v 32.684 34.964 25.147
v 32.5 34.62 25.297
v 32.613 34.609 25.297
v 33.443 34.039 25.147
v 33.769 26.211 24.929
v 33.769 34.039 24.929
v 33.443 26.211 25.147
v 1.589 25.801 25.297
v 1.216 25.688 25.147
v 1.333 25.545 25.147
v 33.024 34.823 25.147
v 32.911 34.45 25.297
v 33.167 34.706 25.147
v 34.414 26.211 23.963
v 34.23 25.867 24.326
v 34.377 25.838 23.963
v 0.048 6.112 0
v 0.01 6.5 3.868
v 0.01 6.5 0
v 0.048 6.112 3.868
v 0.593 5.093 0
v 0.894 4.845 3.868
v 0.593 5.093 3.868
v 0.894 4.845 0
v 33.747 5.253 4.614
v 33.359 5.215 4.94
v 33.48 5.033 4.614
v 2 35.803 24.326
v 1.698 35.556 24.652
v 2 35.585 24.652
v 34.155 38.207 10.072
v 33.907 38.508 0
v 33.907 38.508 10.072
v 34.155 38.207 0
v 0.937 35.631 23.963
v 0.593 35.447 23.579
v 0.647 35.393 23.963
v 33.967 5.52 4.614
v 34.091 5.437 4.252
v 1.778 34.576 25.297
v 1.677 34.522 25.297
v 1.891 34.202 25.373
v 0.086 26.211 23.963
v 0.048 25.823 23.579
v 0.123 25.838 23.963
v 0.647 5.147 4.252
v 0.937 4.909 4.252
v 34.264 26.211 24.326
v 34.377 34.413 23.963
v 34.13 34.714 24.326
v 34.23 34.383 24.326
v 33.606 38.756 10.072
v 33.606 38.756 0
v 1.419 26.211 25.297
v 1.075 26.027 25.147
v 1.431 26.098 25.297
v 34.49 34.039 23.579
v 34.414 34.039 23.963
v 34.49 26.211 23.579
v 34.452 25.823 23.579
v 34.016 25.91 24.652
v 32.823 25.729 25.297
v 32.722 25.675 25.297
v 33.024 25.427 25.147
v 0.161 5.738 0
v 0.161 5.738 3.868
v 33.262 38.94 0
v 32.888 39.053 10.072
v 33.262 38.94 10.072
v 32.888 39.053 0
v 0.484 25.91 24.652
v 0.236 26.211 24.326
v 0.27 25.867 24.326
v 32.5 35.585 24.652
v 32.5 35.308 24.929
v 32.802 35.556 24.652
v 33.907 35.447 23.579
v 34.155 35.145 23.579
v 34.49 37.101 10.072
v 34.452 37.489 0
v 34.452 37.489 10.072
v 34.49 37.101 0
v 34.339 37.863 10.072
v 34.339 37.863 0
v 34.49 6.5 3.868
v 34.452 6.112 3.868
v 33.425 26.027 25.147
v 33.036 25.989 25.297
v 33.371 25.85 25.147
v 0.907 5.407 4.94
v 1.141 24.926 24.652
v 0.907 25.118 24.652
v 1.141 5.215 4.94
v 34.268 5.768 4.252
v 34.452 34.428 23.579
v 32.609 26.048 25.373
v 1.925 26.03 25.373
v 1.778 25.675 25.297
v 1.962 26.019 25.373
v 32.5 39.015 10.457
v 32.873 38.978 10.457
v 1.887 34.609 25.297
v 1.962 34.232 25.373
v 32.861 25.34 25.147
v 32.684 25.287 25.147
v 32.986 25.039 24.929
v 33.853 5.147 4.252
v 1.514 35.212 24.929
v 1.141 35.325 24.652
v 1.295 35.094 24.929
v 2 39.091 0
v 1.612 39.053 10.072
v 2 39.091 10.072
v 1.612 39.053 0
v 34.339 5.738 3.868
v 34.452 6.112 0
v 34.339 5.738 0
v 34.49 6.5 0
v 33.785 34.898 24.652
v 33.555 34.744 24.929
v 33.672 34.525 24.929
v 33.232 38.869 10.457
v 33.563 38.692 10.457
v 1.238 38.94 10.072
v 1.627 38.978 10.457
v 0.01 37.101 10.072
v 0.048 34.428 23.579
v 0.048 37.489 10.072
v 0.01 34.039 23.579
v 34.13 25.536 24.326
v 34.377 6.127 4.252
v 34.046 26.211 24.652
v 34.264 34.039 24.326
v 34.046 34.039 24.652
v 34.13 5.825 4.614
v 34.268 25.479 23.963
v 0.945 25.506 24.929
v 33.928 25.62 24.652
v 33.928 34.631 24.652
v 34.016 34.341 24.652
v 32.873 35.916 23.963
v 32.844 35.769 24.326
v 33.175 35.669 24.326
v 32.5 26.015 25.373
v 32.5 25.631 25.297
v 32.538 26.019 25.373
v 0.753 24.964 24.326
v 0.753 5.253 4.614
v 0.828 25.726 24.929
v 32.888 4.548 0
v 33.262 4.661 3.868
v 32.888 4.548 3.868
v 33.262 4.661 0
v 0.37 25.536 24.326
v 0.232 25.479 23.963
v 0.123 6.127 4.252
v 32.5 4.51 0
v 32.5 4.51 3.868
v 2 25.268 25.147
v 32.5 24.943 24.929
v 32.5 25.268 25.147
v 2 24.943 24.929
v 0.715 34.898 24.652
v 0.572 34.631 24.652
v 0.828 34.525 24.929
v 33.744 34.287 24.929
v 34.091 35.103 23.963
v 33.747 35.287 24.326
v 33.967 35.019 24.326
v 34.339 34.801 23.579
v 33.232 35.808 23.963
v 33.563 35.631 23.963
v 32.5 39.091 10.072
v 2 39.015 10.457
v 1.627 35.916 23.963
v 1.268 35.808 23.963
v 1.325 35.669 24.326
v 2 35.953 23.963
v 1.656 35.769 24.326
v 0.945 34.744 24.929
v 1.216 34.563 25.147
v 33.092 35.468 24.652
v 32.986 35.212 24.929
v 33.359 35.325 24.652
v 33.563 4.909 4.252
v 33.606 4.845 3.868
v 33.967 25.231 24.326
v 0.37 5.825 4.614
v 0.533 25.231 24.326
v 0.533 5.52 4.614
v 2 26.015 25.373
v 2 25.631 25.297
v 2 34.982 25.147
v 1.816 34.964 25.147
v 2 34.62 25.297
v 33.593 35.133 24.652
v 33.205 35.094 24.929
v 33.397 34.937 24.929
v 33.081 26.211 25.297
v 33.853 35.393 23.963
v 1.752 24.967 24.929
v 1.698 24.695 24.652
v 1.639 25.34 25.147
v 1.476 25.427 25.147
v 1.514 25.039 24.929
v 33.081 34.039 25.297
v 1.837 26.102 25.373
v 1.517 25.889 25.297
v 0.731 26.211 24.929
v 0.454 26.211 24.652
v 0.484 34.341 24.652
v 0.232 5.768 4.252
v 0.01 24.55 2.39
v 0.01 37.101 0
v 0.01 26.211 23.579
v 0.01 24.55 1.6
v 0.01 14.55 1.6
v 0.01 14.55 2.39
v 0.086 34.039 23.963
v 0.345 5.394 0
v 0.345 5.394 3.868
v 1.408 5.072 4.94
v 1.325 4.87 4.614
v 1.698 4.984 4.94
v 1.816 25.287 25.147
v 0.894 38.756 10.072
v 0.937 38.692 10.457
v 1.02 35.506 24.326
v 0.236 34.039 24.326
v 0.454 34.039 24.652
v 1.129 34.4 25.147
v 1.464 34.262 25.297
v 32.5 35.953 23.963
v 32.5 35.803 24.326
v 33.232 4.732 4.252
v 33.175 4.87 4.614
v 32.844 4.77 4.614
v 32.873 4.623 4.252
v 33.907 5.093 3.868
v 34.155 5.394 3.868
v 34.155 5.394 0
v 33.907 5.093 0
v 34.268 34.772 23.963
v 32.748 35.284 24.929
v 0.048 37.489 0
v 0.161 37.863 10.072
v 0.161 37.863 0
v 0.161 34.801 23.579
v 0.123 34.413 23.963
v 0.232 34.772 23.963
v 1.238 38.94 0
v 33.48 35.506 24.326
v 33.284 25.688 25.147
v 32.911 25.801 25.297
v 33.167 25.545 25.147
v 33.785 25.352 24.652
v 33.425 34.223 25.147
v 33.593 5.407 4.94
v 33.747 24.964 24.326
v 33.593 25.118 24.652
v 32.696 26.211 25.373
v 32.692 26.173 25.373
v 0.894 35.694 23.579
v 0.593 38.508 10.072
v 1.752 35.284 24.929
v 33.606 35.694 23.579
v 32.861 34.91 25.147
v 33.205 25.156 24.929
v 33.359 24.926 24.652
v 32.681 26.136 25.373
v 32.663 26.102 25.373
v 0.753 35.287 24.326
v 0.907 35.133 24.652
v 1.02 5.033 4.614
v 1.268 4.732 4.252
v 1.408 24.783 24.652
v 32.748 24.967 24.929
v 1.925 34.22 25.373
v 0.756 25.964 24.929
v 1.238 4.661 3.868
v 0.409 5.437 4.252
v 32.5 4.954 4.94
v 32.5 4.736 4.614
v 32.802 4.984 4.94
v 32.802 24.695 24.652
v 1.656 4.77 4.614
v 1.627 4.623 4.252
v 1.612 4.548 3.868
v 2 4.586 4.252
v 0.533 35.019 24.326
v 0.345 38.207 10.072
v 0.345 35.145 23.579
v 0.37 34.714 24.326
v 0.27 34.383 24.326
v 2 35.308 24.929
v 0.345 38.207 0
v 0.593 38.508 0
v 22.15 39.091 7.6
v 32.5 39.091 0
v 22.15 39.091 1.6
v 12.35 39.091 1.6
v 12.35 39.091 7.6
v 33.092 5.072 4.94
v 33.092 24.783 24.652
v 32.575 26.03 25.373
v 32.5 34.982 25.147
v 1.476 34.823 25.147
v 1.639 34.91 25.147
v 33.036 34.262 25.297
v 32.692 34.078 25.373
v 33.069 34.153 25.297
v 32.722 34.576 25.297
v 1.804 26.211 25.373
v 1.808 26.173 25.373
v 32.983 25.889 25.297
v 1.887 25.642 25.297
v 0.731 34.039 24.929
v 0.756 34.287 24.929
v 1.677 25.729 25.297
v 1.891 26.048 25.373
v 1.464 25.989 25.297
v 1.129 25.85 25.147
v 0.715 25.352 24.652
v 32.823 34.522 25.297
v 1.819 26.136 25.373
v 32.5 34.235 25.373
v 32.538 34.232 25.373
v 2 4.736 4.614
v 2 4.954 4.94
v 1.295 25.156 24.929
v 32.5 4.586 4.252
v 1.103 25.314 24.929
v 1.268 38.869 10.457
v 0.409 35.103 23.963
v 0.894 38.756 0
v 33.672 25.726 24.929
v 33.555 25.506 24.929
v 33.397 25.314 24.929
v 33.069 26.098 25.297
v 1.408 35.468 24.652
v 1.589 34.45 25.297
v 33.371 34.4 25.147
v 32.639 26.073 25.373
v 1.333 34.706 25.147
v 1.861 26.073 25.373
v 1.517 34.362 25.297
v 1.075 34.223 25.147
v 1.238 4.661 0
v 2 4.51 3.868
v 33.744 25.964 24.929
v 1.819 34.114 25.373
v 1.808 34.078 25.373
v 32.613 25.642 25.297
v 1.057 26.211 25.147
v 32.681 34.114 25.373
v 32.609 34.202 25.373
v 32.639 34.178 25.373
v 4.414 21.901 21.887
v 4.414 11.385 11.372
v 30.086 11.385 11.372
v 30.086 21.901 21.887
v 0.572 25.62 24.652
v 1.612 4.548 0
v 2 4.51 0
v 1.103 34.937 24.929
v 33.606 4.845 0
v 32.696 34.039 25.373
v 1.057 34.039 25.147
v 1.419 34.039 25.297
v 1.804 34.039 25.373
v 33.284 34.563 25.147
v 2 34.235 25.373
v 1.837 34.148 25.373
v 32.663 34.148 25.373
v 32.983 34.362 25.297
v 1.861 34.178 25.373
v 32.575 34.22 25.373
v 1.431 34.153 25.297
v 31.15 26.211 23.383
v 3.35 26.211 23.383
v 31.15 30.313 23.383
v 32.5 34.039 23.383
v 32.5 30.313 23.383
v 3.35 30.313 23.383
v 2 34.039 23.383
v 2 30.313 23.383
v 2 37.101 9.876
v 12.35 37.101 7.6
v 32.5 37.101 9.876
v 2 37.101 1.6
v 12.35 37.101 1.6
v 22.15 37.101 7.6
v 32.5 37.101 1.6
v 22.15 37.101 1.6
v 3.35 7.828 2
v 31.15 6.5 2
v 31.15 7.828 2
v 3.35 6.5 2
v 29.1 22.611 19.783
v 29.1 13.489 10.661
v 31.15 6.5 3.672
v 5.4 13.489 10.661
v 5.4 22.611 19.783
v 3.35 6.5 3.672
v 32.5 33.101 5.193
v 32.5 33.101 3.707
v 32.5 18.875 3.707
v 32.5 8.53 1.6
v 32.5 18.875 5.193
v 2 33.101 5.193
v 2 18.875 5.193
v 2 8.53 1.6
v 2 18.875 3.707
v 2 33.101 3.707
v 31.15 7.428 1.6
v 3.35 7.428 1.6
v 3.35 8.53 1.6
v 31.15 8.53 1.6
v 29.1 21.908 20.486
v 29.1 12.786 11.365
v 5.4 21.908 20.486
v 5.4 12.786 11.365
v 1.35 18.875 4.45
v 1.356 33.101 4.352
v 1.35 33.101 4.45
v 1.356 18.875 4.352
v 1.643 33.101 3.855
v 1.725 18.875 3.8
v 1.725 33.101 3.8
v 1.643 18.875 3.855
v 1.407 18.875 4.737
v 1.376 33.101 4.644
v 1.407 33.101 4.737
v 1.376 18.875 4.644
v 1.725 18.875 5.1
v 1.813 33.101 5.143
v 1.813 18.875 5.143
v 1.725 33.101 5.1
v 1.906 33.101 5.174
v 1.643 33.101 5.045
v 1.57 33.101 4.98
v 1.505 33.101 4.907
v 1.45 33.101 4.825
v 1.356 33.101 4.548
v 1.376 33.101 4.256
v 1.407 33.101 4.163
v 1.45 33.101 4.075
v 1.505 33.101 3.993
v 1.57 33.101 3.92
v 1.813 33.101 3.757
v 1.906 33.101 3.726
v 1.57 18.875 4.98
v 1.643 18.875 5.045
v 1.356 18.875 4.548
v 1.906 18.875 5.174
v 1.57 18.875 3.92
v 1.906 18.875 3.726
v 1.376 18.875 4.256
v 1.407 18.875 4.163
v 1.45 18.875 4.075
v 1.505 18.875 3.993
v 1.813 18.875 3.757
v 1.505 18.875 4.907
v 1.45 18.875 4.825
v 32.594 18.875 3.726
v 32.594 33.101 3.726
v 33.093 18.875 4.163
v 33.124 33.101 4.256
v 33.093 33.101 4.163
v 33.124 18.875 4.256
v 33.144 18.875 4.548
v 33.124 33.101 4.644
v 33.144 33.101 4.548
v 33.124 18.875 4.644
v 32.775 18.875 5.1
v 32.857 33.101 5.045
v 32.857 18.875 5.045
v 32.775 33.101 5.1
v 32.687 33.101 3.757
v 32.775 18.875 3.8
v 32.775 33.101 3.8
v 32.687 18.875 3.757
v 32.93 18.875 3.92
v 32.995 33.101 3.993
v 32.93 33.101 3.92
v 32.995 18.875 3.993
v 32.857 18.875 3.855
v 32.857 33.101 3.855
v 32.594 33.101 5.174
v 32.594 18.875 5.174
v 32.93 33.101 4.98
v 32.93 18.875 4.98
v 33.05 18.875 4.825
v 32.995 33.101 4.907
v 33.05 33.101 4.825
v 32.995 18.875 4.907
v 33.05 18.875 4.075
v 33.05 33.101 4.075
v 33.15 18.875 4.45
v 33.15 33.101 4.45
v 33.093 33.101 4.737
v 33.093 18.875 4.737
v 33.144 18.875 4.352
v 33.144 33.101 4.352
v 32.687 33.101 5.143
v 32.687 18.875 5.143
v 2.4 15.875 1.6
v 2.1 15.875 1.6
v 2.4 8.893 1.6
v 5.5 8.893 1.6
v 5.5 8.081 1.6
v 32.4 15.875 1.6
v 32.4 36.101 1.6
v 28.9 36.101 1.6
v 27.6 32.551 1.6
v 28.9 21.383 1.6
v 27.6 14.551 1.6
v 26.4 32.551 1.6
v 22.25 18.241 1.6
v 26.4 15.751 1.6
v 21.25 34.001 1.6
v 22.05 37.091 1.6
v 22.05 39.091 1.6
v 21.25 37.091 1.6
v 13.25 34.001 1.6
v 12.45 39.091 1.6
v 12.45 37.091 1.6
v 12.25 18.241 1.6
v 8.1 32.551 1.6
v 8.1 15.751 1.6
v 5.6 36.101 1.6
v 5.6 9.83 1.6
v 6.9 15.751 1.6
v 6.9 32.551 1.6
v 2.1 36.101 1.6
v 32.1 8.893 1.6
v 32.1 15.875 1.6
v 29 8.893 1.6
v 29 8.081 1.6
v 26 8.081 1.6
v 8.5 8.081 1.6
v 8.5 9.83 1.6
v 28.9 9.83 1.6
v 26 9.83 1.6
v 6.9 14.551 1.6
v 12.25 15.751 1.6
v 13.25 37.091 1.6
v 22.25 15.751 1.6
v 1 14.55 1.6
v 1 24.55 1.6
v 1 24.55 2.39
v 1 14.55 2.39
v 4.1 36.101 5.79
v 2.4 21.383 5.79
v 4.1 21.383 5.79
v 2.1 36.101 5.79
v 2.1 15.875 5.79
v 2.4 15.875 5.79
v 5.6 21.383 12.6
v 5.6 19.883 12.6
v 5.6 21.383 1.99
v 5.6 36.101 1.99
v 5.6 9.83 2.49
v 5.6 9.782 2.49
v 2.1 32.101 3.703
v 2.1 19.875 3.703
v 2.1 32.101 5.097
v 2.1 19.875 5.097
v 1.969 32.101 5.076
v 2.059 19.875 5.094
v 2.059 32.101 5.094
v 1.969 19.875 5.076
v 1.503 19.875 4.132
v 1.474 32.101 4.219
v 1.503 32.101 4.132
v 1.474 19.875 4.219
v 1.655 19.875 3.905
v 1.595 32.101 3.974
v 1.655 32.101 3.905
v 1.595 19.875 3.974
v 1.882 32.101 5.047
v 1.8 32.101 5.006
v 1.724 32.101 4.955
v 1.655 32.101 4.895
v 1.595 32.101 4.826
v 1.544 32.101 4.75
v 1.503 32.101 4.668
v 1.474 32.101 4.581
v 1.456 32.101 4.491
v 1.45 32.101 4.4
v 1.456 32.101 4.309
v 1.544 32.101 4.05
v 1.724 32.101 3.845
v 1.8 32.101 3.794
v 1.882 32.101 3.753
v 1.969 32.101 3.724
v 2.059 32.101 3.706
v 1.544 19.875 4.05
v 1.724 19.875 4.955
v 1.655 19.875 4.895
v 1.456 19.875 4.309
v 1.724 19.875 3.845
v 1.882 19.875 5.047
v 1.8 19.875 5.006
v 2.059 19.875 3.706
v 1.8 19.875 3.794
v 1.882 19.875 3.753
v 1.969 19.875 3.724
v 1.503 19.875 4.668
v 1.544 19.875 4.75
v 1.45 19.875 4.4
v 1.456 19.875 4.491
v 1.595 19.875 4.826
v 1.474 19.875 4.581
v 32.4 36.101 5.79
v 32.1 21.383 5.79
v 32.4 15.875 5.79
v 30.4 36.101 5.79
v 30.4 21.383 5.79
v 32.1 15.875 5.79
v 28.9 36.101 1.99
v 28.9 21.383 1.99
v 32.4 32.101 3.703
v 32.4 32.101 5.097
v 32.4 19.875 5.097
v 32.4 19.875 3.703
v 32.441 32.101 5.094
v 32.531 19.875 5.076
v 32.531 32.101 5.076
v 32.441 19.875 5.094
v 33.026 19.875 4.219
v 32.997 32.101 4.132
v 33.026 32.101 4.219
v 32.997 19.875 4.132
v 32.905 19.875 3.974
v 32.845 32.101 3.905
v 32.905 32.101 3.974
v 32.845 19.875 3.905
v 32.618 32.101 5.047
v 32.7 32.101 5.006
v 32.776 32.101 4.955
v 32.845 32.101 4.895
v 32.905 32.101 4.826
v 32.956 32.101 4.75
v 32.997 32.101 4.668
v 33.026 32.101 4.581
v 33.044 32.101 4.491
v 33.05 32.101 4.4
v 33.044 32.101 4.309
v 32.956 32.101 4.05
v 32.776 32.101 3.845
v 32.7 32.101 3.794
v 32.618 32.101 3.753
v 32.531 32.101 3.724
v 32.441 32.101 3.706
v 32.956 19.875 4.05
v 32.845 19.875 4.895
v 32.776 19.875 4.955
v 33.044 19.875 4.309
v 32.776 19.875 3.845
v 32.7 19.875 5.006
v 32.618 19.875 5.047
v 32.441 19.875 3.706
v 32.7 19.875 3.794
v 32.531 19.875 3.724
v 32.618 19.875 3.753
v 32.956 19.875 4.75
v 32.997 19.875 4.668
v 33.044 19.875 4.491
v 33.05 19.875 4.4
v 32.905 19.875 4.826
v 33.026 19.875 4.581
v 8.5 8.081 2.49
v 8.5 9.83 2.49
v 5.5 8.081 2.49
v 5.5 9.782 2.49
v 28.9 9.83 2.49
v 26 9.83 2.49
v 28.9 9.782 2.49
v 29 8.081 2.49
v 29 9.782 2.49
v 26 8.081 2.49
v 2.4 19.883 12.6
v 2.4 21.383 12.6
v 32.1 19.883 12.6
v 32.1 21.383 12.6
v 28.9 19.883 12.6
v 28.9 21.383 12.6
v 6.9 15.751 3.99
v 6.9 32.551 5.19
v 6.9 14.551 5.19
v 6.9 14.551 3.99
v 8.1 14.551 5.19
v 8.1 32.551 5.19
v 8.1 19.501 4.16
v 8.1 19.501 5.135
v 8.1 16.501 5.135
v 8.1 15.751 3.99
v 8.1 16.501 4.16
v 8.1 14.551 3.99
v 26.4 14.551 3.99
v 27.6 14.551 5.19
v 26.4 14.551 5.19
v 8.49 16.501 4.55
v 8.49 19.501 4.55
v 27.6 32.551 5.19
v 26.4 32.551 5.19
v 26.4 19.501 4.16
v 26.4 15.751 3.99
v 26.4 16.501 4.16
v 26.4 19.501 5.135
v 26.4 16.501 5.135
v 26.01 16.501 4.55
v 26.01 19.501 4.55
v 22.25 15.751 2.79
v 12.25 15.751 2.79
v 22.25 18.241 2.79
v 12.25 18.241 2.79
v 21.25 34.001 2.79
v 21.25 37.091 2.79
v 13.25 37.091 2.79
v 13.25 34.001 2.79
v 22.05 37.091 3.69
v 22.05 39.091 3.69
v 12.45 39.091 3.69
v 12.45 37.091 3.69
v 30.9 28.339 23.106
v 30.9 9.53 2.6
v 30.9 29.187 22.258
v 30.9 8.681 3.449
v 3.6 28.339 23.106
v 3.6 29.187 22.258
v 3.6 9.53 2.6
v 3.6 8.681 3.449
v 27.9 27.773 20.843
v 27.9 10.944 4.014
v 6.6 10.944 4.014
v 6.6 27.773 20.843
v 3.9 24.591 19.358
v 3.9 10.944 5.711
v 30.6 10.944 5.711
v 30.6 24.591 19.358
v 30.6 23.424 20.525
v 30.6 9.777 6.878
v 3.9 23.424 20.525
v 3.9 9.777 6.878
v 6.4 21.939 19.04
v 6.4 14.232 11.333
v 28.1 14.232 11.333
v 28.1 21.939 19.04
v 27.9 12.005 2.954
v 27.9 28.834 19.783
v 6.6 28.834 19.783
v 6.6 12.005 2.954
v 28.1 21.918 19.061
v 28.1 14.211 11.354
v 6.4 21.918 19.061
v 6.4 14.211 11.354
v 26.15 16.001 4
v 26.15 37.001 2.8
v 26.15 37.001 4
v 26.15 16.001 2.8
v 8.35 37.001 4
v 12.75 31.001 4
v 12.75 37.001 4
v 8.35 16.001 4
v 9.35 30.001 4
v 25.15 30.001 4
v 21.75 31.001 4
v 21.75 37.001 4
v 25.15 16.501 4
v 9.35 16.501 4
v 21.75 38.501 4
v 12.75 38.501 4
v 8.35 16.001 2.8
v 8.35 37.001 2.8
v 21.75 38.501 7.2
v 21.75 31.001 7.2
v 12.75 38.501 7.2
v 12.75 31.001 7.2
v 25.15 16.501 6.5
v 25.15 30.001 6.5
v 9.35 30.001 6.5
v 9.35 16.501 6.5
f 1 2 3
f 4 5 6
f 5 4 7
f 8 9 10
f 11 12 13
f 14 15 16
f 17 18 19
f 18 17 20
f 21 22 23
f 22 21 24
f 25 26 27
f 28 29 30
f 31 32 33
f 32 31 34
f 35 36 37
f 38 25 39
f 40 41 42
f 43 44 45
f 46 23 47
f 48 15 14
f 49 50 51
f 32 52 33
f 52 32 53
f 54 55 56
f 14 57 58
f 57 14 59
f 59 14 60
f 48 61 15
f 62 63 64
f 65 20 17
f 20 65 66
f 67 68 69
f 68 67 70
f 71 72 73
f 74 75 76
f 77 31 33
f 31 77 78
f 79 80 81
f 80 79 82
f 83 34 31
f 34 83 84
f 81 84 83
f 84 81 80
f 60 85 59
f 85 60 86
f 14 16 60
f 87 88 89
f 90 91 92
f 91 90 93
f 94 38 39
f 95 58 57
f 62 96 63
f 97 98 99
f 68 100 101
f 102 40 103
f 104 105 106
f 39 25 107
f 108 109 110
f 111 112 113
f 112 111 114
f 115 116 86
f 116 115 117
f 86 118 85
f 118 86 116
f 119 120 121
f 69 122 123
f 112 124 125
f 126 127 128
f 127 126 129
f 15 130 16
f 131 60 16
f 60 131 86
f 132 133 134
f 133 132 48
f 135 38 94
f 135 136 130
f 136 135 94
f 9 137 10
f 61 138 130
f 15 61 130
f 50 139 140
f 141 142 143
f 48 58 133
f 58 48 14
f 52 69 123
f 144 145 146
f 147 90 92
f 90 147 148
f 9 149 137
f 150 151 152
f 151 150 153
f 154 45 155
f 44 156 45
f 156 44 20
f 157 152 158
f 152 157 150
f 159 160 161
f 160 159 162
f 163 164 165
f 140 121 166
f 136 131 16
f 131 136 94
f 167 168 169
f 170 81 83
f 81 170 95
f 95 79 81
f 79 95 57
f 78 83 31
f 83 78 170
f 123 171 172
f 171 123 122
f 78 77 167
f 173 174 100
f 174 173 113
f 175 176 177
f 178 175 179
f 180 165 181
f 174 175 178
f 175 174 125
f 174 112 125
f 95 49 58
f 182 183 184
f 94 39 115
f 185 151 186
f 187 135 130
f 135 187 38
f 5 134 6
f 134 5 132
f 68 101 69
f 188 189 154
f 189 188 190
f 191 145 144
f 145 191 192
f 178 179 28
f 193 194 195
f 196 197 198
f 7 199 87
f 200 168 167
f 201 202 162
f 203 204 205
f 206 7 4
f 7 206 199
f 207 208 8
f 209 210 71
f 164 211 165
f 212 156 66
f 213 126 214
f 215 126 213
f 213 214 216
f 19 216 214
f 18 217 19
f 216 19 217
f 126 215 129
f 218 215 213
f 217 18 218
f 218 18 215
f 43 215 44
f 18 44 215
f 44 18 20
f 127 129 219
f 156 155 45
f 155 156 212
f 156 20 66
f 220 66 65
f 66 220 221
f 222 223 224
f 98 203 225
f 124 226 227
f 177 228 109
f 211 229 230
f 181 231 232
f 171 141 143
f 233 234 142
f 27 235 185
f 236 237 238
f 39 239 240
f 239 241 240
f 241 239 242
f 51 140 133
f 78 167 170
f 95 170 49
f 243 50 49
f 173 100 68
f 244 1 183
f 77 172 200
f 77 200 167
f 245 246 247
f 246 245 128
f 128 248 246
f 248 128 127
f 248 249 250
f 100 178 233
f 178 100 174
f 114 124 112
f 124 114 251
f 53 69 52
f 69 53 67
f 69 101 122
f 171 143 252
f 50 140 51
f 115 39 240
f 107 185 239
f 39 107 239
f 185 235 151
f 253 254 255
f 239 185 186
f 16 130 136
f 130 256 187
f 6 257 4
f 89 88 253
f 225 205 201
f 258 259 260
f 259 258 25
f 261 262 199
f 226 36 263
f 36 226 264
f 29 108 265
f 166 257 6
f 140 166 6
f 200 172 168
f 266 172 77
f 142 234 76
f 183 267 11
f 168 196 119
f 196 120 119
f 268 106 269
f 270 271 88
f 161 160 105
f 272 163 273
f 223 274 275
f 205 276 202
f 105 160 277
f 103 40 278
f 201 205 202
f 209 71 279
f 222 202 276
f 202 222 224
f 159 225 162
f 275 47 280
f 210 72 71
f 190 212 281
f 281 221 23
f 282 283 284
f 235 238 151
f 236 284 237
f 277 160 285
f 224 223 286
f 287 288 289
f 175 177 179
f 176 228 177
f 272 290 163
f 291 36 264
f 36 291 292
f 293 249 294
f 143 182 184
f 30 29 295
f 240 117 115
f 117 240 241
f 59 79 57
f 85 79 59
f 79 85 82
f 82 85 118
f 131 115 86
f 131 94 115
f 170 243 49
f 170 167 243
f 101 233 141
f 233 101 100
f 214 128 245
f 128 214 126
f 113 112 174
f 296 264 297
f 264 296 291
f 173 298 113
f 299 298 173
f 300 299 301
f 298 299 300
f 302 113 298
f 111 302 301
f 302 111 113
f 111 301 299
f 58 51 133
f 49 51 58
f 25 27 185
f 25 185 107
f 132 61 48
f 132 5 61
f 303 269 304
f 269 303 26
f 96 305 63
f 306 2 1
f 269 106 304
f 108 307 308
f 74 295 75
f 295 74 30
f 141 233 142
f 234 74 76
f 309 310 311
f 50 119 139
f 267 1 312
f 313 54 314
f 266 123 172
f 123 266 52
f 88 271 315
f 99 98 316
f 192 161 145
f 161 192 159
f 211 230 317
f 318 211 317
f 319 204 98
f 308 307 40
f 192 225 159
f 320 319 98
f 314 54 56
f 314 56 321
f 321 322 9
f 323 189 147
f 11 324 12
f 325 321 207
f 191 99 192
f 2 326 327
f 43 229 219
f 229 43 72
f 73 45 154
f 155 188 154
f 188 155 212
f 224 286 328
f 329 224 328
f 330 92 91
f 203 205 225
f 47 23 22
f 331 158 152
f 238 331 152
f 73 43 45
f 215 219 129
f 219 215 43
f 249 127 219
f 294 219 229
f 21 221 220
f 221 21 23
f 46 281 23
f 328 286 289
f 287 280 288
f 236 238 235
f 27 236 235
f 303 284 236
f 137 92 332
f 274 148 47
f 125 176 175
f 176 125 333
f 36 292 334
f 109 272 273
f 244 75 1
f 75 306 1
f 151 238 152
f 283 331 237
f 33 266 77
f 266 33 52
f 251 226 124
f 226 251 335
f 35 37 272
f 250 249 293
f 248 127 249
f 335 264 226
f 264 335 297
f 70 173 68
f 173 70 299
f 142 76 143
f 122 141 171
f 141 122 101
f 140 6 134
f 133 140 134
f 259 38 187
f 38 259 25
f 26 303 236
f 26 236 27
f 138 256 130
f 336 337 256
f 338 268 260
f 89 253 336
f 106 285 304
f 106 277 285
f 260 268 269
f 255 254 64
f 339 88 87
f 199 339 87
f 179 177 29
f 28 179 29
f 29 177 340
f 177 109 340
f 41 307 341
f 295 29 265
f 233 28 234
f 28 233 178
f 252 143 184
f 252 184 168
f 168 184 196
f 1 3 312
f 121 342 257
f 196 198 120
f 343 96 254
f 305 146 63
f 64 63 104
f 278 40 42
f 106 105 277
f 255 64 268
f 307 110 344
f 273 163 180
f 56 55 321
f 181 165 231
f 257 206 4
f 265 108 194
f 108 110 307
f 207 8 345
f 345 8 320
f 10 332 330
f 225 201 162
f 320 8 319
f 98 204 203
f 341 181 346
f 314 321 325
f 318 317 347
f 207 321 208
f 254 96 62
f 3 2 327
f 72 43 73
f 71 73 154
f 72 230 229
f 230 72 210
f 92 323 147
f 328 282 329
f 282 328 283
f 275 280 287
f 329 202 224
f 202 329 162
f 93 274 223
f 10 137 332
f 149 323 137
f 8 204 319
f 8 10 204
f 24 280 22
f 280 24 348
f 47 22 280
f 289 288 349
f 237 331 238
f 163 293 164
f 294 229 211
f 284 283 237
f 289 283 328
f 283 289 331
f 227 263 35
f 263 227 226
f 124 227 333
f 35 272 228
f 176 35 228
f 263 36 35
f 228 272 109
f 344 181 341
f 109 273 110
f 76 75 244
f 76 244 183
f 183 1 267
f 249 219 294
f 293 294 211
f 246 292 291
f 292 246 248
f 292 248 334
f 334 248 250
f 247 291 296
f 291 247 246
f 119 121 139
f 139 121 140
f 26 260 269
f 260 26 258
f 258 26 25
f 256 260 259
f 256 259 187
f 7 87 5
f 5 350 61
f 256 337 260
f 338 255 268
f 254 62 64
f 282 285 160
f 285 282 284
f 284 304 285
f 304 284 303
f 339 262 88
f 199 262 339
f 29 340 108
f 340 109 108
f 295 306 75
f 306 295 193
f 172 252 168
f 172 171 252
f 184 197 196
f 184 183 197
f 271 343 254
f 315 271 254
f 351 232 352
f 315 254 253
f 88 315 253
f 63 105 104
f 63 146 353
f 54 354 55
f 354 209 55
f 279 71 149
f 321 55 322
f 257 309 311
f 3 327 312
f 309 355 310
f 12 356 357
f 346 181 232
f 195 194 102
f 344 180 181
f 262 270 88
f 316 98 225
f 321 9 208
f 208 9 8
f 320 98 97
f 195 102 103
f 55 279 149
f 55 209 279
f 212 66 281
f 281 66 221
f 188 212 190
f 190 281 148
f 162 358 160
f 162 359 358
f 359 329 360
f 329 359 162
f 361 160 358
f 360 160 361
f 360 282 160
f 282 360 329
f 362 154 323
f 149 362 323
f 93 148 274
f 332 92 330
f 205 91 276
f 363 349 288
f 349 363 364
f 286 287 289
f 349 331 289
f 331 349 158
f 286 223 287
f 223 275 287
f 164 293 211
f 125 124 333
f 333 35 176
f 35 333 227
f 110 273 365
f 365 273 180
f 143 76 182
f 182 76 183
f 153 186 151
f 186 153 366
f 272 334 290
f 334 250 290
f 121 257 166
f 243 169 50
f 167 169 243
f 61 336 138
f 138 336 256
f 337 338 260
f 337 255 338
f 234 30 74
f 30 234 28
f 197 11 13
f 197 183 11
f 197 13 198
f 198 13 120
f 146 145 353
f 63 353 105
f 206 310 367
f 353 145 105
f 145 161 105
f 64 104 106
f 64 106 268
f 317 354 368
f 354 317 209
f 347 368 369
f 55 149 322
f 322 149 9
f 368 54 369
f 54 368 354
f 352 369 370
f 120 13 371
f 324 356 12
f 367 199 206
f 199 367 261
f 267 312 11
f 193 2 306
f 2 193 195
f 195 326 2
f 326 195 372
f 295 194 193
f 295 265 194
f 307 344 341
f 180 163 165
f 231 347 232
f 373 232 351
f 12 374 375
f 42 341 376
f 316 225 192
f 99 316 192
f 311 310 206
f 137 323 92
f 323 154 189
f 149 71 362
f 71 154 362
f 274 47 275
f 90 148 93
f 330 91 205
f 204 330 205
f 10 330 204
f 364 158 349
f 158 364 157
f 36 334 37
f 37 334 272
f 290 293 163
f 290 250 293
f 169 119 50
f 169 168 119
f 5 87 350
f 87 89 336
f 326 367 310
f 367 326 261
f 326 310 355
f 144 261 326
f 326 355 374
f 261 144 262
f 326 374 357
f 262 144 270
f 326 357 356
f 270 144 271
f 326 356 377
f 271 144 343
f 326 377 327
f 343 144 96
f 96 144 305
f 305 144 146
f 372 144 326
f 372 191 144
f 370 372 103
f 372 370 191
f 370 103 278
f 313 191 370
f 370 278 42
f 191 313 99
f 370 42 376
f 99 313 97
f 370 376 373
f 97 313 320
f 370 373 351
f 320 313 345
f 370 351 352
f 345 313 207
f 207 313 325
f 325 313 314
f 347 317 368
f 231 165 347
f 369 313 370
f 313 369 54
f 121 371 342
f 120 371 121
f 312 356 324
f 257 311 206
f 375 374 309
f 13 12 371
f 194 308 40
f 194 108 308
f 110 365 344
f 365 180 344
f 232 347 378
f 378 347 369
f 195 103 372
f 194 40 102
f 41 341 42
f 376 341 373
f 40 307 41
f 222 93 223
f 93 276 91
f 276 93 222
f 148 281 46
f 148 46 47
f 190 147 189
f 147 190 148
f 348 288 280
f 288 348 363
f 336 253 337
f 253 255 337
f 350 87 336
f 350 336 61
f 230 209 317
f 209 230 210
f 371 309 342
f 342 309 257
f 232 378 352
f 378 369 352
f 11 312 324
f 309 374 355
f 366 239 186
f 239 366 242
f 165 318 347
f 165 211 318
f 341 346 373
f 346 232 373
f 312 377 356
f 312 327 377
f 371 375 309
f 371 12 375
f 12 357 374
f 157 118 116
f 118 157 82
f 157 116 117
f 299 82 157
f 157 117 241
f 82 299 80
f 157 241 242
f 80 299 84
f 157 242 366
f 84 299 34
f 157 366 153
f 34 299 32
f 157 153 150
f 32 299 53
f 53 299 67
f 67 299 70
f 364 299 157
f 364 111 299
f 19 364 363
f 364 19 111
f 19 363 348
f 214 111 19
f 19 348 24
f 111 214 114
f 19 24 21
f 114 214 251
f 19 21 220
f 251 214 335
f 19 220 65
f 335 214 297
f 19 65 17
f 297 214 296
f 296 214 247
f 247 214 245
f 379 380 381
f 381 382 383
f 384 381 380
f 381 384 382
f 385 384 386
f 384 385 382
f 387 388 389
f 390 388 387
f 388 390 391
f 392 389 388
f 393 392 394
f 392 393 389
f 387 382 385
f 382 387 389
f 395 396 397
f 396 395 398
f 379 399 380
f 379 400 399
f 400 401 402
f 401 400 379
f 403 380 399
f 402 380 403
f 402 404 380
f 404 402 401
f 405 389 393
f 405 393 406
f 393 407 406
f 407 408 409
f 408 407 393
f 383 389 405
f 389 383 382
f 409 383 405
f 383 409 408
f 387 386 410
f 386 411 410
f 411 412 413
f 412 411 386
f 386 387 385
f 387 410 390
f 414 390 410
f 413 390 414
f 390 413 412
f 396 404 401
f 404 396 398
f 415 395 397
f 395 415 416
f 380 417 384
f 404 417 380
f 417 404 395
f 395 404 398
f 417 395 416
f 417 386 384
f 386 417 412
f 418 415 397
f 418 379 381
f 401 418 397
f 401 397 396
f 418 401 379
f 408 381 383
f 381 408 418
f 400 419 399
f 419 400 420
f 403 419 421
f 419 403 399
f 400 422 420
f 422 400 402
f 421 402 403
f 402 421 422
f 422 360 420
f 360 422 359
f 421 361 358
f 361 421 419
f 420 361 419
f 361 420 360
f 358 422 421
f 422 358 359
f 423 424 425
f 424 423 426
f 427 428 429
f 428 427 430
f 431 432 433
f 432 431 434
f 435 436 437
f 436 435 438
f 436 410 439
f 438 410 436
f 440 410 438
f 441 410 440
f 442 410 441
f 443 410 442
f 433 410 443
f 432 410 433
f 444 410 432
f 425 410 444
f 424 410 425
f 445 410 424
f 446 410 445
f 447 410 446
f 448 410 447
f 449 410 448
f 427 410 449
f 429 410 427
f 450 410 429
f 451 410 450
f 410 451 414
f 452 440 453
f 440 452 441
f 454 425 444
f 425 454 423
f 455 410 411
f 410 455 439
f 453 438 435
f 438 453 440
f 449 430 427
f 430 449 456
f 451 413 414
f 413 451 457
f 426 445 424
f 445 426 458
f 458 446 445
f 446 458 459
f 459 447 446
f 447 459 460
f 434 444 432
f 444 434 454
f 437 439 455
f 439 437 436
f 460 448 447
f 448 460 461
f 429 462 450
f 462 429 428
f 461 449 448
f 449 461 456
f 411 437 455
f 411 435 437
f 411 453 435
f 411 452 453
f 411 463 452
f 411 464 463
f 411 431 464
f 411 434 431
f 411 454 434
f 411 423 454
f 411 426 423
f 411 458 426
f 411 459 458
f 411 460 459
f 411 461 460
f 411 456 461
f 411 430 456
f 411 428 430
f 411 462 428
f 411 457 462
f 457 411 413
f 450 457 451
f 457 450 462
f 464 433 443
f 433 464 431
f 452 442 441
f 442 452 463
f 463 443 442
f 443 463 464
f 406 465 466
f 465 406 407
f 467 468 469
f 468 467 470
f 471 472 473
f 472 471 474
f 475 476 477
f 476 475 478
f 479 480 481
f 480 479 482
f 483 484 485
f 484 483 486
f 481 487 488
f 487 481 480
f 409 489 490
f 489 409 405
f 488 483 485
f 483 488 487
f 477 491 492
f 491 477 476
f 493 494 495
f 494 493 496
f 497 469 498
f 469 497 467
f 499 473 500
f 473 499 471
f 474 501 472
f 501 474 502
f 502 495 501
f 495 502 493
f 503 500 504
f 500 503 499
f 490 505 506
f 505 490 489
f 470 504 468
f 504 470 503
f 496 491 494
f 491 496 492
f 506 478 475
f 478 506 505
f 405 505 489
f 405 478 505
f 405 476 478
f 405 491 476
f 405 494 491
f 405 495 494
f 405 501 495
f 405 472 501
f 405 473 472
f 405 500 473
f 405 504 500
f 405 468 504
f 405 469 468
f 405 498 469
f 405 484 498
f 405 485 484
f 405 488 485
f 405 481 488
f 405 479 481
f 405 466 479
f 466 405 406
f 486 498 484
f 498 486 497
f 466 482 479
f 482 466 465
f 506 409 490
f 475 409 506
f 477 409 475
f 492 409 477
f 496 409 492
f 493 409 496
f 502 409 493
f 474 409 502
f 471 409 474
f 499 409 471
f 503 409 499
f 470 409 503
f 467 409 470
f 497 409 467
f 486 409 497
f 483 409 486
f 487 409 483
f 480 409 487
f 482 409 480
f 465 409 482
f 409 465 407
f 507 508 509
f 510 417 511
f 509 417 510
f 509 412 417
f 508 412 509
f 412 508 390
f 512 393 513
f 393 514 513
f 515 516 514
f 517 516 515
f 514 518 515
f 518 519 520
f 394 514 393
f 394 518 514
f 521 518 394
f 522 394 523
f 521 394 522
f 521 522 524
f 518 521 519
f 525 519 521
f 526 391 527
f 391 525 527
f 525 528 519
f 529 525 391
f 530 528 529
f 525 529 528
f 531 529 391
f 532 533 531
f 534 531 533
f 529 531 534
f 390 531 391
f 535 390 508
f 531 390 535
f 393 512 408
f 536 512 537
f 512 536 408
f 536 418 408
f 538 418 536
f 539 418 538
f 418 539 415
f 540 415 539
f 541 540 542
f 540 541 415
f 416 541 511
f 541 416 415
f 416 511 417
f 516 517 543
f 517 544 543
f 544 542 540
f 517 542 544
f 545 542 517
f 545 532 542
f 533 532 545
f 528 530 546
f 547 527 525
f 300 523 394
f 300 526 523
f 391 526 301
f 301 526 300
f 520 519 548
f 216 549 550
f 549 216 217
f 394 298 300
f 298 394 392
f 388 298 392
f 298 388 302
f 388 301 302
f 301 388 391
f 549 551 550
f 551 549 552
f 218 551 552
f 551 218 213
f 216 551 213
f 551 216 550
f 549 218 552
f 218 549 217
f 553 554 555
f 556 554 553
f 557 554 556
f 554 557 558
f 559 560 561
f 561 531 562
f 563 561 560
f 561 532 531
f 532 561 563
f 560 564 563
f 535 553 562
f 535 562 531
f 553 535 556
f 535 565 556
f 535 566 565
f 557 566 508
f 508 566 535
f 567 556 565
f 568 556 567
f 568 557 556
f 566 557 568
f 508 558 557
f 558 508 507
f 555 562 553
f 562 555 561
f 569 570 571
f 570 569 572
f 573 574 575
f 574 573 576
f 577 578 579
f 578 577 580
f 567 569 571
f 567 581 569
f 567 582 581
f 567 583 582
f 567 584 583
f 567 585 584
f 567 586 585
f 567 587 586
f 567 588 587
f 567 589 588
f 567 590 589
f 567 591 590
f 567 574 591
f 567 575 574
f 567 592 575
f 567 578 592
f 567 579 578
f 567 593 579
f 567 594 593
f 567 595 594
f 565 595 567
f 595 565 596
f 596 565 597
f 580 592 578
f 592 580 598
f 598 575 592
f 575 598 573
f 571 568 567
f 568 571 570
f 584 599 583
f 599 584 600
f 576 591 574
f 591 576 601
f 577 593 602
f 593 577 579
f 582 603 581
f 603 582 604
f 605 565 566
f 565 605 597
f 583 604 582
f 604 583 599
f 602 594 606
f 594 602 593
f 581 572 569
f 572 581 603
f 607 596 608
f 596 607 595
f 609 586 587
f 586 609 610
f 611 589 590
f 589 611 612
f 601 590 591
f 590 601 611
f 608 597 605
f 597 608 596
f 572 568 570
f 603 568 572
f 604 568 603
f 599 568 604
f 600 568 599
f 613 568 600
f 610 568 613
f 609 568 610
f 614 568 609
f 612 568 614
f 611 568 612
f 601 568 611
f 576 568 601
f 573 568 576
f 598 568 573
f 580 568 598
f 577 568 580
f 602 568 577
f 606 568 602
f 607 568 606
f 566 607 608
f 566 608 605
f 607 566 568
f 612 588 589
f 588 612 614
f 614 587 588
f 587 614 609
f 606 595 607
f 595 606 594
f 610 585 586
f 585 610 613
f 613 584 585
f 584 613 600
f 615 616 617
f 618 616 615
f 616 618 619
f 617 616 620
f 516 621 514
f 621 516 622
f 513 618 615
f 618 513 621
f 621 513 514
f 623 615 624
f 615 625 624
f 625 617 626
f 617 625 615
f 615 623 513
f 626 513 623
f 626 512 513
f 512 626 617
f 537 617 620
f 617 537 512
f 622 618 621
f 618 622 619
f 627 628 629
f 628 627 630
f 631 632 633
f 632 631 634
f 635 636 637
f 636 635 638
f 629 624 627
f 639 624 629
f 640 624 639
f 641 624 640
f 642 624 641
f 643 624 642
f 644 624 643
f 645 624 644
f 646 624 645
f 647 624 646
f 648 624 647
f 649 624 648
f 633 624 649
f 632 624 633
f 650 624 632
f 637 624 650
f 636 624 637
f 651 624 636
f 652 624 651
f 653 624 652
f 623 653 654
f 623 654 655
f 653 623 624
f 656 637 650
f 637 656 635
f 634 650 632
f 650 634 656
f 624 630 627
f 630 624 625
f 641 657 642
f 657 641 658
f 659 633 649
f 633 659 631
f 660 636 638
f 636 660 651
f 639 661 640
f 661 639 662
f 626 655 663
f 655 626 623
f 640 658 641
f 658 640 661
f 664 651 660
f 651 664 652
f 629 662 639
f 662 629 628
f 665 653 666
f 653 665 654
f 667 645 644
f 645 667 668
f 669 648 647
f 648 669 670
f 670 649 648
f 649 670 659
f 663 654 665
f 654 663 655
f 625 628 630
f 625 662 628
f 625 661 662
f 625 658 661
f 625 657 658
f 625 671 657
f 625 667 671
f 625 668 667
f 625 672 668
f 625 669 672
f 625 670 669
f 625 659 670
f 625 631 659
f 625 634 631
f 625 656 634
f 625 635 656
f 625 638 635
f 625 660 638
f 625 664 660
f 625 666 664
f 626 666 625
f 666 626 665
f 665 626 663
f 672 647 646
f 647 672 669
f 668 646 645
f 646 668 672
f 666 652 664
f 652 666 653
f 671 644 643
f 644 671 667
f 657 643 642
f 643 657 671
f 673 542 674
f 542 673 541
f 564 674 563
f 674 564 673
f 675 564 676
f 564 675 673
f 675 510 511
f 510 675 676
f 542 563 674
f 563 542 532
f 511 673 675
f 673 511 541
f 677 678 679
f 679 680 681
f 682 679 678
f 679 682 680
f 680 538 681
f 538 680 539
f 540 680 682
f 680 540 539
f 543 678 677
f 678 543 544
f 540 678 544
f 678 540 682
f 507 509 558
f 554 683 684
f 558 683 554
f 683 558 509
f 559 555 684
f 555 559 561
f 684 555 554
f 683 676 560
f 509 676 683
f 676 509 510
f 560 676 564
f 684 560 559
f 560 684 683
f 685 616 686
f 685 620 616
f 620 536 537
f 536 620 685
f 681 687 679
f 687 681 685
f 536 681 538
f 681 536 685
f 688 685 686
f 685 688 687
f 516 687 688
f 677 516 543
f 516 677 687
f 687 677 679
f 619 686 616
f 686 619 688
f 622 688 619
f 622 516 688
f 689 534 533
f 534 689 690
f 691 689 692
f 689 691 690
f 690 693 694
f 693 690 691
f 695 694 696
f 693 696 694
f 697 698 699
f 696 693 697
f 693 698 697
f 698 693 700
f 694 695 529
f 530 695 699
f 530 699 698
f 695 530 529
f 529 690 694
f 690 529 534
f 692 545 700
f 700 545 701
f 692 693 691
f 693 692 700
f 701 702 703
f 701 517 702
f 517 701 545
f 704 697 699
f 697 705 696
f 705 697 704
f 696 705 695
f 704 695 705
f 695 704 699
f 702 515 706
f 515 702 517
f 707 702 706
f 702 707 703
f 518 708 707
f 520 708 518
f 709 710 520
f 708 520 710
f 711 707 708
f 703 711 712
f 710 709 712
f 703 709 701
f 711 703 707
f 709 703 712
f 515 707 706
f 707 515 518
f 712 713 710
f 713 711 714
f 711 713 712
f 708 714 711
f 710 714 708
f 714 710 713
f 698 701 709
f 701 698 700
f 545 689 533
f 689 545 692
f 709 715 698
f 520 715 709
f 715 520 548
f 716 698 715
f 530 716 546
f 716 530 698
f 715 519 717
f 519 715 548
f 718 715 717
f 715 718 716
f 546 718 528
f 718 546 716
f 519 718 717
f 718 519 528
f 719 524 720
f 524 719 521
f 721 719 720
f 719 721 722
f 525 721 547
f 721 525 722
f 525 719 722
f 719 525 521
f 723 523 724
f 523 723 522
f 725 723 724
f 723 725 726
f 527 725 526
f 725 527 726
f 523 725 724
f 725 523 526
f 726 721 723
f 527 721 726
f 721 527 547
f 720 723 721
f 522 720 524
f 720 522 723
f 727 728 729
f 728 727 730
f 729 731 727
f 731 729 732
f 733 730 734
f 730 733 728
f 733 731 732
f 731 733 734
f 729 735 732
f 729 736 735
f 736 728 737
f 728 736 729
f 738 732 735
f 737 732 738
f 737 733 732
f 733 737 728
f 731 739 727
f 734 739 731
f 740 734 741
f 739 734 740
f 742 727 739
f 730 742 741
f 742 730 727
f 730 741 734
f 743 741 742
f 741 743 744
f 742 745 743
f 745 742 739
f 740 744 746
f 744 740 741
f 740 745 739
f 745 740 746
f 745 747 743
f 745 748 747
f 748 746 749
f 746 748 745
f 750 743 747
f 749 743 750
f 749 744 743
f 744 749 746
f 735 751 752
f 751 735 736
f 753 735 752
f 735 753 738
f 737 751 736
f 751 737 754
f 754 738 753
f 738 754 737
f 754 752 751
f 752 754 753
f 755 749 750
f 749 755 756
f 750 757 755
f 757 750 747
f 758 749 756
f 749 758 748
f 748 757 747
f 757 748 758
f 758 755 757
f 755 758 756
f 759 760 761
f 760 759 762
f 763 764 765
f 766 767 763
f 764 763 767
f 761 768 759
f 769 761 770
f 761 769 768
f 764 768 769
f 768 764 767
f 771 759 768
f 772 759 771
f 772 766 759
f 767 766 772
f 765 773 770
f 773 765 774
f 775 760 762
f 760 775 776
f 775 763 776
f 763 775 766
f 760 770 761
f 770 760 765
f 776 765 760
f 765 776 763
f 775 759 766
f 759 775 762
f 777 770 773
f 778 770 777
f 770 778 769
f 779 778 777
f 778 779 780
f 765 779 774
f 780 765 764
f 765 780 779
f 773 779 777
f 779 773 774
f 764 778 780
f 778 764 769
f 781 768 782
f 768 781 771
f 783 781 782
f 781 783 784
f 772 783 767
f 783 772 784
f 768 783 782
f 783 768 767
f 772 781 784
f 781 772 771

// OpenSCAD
// Desk enclosure for the CoH3 display: a Seeed XIAO ESP32-C6 and a 0.96" SSD1306 module.
//
// Two parts, both printed without supports as they stand here:
//   shell  front with the screen window, sides, top and back; open underneath
//   base   the foot; carries the XIAO and snaps into the shell
//
// The display lies in a pocket behind the front wall. Nothing on the shell grips it: two
// ramps on the base press it against the wall, and two nubs carry it, once the case is
// closed. The case is as small as the two boards allow with the USB-C port at the back.
// Measure your display module before printing: see README.md.

/* [What to show] */
// assembly and section are for looking at; shell, base and fit_test are for printing.
part = "assembly"; // [assembly, section, shell, base, fit_test, clash]

/* [Display module] */
disp_w = 27.3;      // PCB width
disp_h = 27.8;      // PCB height (pins on the upper edge)
disp_t = 1.2;       // PCB thickness
glass_w = 26.7;
glass_h = 19.3;
// Front of the glass to the back of the PCB, measured at a side edge. This includes the
// tape the glass is stuck on with, and decides whether the module fits its rails.
disp_stack = 2.8;
glass_top = 5.3;    // PCB upper edge to glass upper edge
lit_w = 21.7;       // lit area, centred left to right
lit_h = 10.9;
lit_top = 2.1;      // glass upper edge to lit area upper edge

/* [XIAO ESP32-C6] */
xiao_l = 21.0;
xiao_w = 17.8;
xiao_t = 1.2;
usb_w = 9.0;        // USB-C shell
usb_h = 3.2;
usb_out = 1.5;      // how far it sticks out past the PCB
xiao_parts_h = 2.5; // tallest component on top

/* [Case] */
tilt = 45;          // how far the screen leans back, degrees
wall = 2.0;
plate_t = 1.6;      // thickness of the foot
corner_r = 2.0;     // rounding of the outside edges
side_gap = 1.6;     // between the display PCB and each side wall
fit = 0.25;         // clearance around the boards; raise if they do not go in
snap = 0.1;         // clearance of the base in the shell; raise if it is too tight
window_margin = 1.0;
flex_room = 1.0;    // below the display, for the fold of its flex cable
nose_h = 4.5;       // height of the blunt front edge, in place of a thin sharp toe

/* [Hidden] */
$fn = 48;
eps = 0.01;

// ---------------------------------------------------------------------------------------
// Geometry helpers. World: x across, y front to back, z up. "Face" coordinates describe
// things relative to the tilted front wall: n = into the case, v = up the slope.

function face_y(n, v) = n * cos(tilt) + v * sin(tilt);
function face_z(n, v) = -n * sin(tilt) + v * cos(tilt);

// Puts children built with y = n and z = v onto the front wall.
module on_face() {
    rotate([-tilt, 0, 0]) children();
}

disp_n1 = wall + disp_stack + 0.1;    // back of the display PCB
disp_n0 = disp_n1 - disp_t;           // front of the display PCB
rail_n = disp_n1 + 0.3;               // front of the lips that hold it
rail_t = 1.5;
width = disp_w + 2 * side_gap + 2 * wall;
disp_x0 = (width - disp_w) / 2;
// The display starts just above the foot and ends against the roof.
disp_v0 = (plate_t + flex_room + disp_n1 * sin(tilt)) / cos(tilt);
disp_v1 = disp_v0 + disp_h + fit;

height = face_z(disp_n0, disp_v1) + 0.1 + wall;
face_len = height / cos(tilt);

xiao_x = width / 2;
xiao_z0 = plate_t + 1.2;              // underside, lifted clear of solder joints
xiao_z1 = xiao_z0 + xiao_t;
// The XIAO goes as far under the leaning display as the parts on the display's back allow:
// neither the front of its cradle nor its own components may touch them.
cradle_h = xiao_z1 + 1.2;
xiao_y0 = (disp_n1 + 1.5) / cos(tilt) + 0.3
    + max(cradle_h * tan(tilt) + 1.2 + fit, (xiao_z1 + xiao_parts_h) * tan(tilt) - 0.5);
xiao_y1 = xiao_y0 + xiao_l;           // USB end of the PCB, against the back wall
depth = xiao_y1 + 0.1 + wall;

usb_gap = 0.4;
snap_rim_h = 4.2;
snap_z = plate_t + 2.8;
// The rims start behind the display rails, which lean back over the base.
snap_y0 = (rail_n + rail_t + (plate_t + snap_rim_h) * sin(tilt)) / cos(tilt) + 0.6;
snap_y1 = depth - wall - 1;

// The back wall is upright as far as the USB port needs it, then leans in towards the top
// of the display, which leaves room for the wires but little else.
back_knee_z = xiao_z1 + usb_h + usb_gap + 2.5;
roof_y1 = face_y(rail_n + rail_t, disp_v1) + 3 + wall;

// Side view of the whole case. `below` continues it under the foot.
module profile(below = 0) {
    nose_y = nose_h * tan(tilt);
    polygon([
        [nose_y, -below],
        [nose_y, nose_h],
        [face_len * sin(tilt), height],
        [roof_y1, height],
        [depth, back_knee_z],
        [depth, -below],
    ]);
}

// The outside: the profile across the full width, with every edge rounded except those of
// the foot, which stays flat and sharp so that it prints cleanly.
module body() {
    intersection() {
        minkowski() {
            across(corner_r, width - corner_r) offset(delta = -corner_r) profile(below = 10);
            sphere(r = corner_r, $fn = 32);
        }
        translate([-1, -20, 0]) cube([width + 2, depth + 40, height + 1]);
    }
}

// Extrudes a side-view shape across x from x0 to x1.
module across(x0, x1) {
    translate([x0, 0, 0]) rotate([90, 0, 90]) linear_extrude(x1 - x0) children();
}

// The hollow inside, optionally grown a little into the walls so that parts joined to
// them overlap instead of merely touching.
module cavity(grow = 0) {
    across(wall - grow, width - wall + grow) offset(delta = grow - wall) profile();
}

module mirror_x() {
    children();
    translate([width, 0, 0]) mirror([1, 0, 0]) children();
}

// ---------------------------------------------------------------------------------------
// Shell

module window() {
    w = lit_w + 2 * window_margin;
    h = lit_h + 2 * window_margin;
    v_top = disp_v0 + disp_h - glass_top - lit_top + window_margin;
    on_face() translate([width / 2, 0, v_top - h / 2]) {
        cube([w, 3 * wall, h], center = true);
        // Opens out towards the viewer, so the edge does not shade the screen.
        hull() {
            translate([0, wall / 2, 0]) cube([w, eps, h], center = true);
            translate([0, -eps, 0]) cube([w + wall, eps, h + wall], center = true);
        }
    }
}

// One of the two guides that keep the display from moving sideways. They end level with
// the back of its PCB, so the display can simply be laid in from behind.
module rail() {
    on_face() translate([0, 0, -10]) cube([disp_x0 - fit, disp_n1, face_len + 20]);
}

module usb_notch() {
    w = usb_w + 2 * usb_gap;
    translate([xiao_x - w / 2, depth - wall - 1, -1]) cube([w, wall + 2, xiao_z1 + usb_h + usb_gap + 1]);
}

module snap_groove() {
    // A touch above the ridge, so the ridge bears on its lower flank and pulls the shell down.
    translate([wall + 0.1, (snap_y0 + snap_y1) / 2, snap_z + 0.05]) rotate([90, 0, 0])
        cylinder(r = 0.75, h = snap_y1 - snap_y0 - 6, center = true);
}

module shell() {
    difference() {
        union() {
            difference() {
                body();
                cavity();
                // Open underneath.
                translate([0, 0, -wall - 1]) cavity();
            }
            intersection() {
                mirror_x() rail();
                cavity(0.5);
            }
        }
        // It stands on the base plate.
        translate([-1, -1, -10]) cube([width + 2, depth + 2, 10 + plate_t]);
        window();
        usb_notch();
        mirror_x() snap_groove();
        // A place to get a fingernail under the shell when opening it.
        translate([-1, depth / 2 - 5, plate_t - eps]) cube([wall, 10, 0.8]);
    }
}

// ---------------------------------------------------------------------------------------
// Base

module snap_rim() {
    x = wall + snap;
    // Solid, with a buttress on the inside: printed upright, a thin rim would snap off along
    // its layers. It does not bend; the shell's side walls spring out over the ridge instead.
    translate([x, snap_y0, plate_t - eps]) hull() {
        cube([2.0, snap_y1 - snap_y0, snap_rim_h]);
        cube([3.5, snap_y1 - snap_y0, 0.4]);
    }
    // The ridge that clicks into the groove of the shell.
    translate([x + 0.05, (snap_y0 + snap_y1) / 2, snap_z]) rotate([90, 0, 0])
        cylinder(r = 0.7, h = snap_y1 - snap_y0 - 8, center = true);
}

// One of the two ramps that hold the display against the front wall. They overlap the
// outer 2 mm of the back of its PCB and are solid wedges, so there is nothing to snap off.
module display_ramp() {
    x0 = wall + 0.4;
    back = (disp_n1 + 0.25) / cos(tilt);
    z1 = min(plate_t + 11, height - wall - 3);
    y0 = back + plate_t * tan(tilt);
    y1 = back + z1 * tan(tilt);
    translate([x0, 0, 0]) rotate([90, 0, 90]) linear_extrude(disp_x0 + 2.0 - x0)
        polygon([[y0, plate_t - eps], [y1, z1], [y1 + 1.5, z1], [y1 + 1.5, plate_t - eps]]);
}

// The display stands on two of these, which leaves the middle free for the fold of the
// flex cable.
module display_post() {
    y0 = face_y(disp_n0, disp_v0) - 0.6;
    y1 = face_y(disp_n1, disp_v0) + 0.3;
    translate([disp_x0 + 1.9, y0, plate_t - eps]) cube([3, y1 - y0, face_z(disp_n1, disp_v0) - 0.1 - plate_t]);
}

module xiao_cradle() {
    half = xiao_w / 2 + fit;
    rail_y0 = xiao_y0 - fit - 1.2;
    // Side rails, with a small bump each that the PCB clicks under.
    for (side = [-1, 1]) translate([xiao_x, 0, 0]) scale([side, 1, 1]) {
        translate([half, rail_y0, plate_t - eps]) cube([1.2, xiao_l - 3, cradle_h - plate_t]);
        translate([half + eps, xiao_y0 + 0.5, xiao_z1 + 0.15]) rotate([-90, 0, 0])
            linear_extrude(3) polygon([[0, 0], [-0.4, -0.4], [0, -1.0]]);
    }
    // Stop at the antenna end.
    translate([xiao_x - half - 1.2, rail_y0, plate_t - eps]) cube([2 * half + 2.4, 1.2, xiao_z1 - plate_t]);
    // The PCB rests on these two, away from the pad rows and their solder joints.
    translate([xiao_x - 5, xiao_y0 - fit - eps, plate_t - eps]) cube([10, 2.5, xiao_z0 - plate_t]);
    translate([xiao_x - 4, xiao_y1 - 3, plate_t - eps]) cube([8, 3 + 0.1, xiao_z0 - plate_t]);
    // Fills the part of the shell's USB opening that is below the connector.
    w = usb_w + 2 * usb_gap - 2 * snap;
    translate([xiao_x - w / 2, depth - wall - eps, plate_t - eps]) cube([w, wall, xiao_z1 - 0.3 - plate_t]);
}

module base() {
    intersection() {
        body();
        translate([-1, -1, 0]) cube([width + 2, depth + 2, plate_t]);
    }
    mirror_x() snap_rim();
    mirror_x() display_post();
    mirror_x() display_ramp();
    xiao_cradle();
}

// ---------------------------------------------------------------------------------------
// The boards, for looking at and for the clash check.

module display_board() {
    on_face() {
        color("darkgreen") translate([disp_x0, disp_n0, disp_v0]) cube([disp_w, disp_t, disp_h]);
        color("dimgray") translate([(width - glass_w) / 2, wall + 0.05, disp_v0 + disp_h - glass_top - glass_h])
            cube([glass_w, disp_n0 - wall - 0.05, glass_h]);
        // Components on the back.
        color("black") translate([disp_x0 + 3, disp_n1, disp_v0 + 2]) cube([disp_w - 6, 1.5, disp_h - 4]);
        color("deepskyblue")
            translate([(width - lit_w) / 2, wall + 0.02, disp_v0 + disp_h - glass_top - lit_top - lit_h])
            cube([lit_w, 0.05, lit_h]);
    }
}

module xiao_board() {
    color("darkgreen") translate([xiao_x - xiao_w / 2, xiao_y0, xiao_z0]) cube([xiao_w, xiao_l, xiao_t]);
    color("silver") translate([xiao_x - usb_w / 2, xiao_y1 - 6, xiao_z1]) cube([usb_w, 6 + usb_out, usb_h]);
    color("black") translate([xiao_x - xiao_w / 2 + 1, xiao_y0 + 0.5, xiao_z1])
        cube([xiao_w - 2, xiao_l - 7.5, xiao_parts_h]);
}

module boards() {
    display_board();
    xiao_board();
}

// ---------------------------------------------------------------------------------------

module assembly() {
    color("gainsboro") shell();
    color("slategray") base();
    boards();
}

if (part == "assembly") {
    assembly();
} else if (part == "section") {
    // Cut open a little left of the middle, so one display post and one cradle rail show.
    difference() {
        assembly();
        translate([-1, -1, -1]) cube([disp_x0 + 3.5 + 1, depth + 2, height + 2]);
    }
} else if (part == "shell") {
    translate([0, 0, -plate_t]) shell();
} else if (part == "base") {
    base();
} else if (part == "fit_test") {
    // The lowest 12 mm of the shell, and the whole base: a quick print to check that both
    // boards fit and that the two parts snap together, before printing the real shell.
    translate([0, 0, -plate_t]) intersection() {
        shell();
        translate([-1, -1, 0]) cube([width + 2, depth + 2, plate_t + 12]);
    }
    translate([width + 5, 0, 0]) base();
} else if (part == "clash") {
    // Must come out empty: no board touches the printed parts, and the two parts do not
    // run into each other.
    intersection() {
        union() {
            shell();
            base();
        }
        boards();
    }
    intersection() {
        shell();
        base();
    }
}

// Closing the case: the base, carrying the XIAO, moves straight up into the shell, which
// holds the display. With `part = "motion"` this shows what is in the way when the base is
// still `lift` mm short of home. Only the snap ridges may touch the side walls.
lift = 5;
if (part == "motion") {
    intersection() {
        union() {
            shell();
            display_board();
        }
        translate([0, 0, -lift]) union() {
            base();
            xiao_board();
        }
    }
}
